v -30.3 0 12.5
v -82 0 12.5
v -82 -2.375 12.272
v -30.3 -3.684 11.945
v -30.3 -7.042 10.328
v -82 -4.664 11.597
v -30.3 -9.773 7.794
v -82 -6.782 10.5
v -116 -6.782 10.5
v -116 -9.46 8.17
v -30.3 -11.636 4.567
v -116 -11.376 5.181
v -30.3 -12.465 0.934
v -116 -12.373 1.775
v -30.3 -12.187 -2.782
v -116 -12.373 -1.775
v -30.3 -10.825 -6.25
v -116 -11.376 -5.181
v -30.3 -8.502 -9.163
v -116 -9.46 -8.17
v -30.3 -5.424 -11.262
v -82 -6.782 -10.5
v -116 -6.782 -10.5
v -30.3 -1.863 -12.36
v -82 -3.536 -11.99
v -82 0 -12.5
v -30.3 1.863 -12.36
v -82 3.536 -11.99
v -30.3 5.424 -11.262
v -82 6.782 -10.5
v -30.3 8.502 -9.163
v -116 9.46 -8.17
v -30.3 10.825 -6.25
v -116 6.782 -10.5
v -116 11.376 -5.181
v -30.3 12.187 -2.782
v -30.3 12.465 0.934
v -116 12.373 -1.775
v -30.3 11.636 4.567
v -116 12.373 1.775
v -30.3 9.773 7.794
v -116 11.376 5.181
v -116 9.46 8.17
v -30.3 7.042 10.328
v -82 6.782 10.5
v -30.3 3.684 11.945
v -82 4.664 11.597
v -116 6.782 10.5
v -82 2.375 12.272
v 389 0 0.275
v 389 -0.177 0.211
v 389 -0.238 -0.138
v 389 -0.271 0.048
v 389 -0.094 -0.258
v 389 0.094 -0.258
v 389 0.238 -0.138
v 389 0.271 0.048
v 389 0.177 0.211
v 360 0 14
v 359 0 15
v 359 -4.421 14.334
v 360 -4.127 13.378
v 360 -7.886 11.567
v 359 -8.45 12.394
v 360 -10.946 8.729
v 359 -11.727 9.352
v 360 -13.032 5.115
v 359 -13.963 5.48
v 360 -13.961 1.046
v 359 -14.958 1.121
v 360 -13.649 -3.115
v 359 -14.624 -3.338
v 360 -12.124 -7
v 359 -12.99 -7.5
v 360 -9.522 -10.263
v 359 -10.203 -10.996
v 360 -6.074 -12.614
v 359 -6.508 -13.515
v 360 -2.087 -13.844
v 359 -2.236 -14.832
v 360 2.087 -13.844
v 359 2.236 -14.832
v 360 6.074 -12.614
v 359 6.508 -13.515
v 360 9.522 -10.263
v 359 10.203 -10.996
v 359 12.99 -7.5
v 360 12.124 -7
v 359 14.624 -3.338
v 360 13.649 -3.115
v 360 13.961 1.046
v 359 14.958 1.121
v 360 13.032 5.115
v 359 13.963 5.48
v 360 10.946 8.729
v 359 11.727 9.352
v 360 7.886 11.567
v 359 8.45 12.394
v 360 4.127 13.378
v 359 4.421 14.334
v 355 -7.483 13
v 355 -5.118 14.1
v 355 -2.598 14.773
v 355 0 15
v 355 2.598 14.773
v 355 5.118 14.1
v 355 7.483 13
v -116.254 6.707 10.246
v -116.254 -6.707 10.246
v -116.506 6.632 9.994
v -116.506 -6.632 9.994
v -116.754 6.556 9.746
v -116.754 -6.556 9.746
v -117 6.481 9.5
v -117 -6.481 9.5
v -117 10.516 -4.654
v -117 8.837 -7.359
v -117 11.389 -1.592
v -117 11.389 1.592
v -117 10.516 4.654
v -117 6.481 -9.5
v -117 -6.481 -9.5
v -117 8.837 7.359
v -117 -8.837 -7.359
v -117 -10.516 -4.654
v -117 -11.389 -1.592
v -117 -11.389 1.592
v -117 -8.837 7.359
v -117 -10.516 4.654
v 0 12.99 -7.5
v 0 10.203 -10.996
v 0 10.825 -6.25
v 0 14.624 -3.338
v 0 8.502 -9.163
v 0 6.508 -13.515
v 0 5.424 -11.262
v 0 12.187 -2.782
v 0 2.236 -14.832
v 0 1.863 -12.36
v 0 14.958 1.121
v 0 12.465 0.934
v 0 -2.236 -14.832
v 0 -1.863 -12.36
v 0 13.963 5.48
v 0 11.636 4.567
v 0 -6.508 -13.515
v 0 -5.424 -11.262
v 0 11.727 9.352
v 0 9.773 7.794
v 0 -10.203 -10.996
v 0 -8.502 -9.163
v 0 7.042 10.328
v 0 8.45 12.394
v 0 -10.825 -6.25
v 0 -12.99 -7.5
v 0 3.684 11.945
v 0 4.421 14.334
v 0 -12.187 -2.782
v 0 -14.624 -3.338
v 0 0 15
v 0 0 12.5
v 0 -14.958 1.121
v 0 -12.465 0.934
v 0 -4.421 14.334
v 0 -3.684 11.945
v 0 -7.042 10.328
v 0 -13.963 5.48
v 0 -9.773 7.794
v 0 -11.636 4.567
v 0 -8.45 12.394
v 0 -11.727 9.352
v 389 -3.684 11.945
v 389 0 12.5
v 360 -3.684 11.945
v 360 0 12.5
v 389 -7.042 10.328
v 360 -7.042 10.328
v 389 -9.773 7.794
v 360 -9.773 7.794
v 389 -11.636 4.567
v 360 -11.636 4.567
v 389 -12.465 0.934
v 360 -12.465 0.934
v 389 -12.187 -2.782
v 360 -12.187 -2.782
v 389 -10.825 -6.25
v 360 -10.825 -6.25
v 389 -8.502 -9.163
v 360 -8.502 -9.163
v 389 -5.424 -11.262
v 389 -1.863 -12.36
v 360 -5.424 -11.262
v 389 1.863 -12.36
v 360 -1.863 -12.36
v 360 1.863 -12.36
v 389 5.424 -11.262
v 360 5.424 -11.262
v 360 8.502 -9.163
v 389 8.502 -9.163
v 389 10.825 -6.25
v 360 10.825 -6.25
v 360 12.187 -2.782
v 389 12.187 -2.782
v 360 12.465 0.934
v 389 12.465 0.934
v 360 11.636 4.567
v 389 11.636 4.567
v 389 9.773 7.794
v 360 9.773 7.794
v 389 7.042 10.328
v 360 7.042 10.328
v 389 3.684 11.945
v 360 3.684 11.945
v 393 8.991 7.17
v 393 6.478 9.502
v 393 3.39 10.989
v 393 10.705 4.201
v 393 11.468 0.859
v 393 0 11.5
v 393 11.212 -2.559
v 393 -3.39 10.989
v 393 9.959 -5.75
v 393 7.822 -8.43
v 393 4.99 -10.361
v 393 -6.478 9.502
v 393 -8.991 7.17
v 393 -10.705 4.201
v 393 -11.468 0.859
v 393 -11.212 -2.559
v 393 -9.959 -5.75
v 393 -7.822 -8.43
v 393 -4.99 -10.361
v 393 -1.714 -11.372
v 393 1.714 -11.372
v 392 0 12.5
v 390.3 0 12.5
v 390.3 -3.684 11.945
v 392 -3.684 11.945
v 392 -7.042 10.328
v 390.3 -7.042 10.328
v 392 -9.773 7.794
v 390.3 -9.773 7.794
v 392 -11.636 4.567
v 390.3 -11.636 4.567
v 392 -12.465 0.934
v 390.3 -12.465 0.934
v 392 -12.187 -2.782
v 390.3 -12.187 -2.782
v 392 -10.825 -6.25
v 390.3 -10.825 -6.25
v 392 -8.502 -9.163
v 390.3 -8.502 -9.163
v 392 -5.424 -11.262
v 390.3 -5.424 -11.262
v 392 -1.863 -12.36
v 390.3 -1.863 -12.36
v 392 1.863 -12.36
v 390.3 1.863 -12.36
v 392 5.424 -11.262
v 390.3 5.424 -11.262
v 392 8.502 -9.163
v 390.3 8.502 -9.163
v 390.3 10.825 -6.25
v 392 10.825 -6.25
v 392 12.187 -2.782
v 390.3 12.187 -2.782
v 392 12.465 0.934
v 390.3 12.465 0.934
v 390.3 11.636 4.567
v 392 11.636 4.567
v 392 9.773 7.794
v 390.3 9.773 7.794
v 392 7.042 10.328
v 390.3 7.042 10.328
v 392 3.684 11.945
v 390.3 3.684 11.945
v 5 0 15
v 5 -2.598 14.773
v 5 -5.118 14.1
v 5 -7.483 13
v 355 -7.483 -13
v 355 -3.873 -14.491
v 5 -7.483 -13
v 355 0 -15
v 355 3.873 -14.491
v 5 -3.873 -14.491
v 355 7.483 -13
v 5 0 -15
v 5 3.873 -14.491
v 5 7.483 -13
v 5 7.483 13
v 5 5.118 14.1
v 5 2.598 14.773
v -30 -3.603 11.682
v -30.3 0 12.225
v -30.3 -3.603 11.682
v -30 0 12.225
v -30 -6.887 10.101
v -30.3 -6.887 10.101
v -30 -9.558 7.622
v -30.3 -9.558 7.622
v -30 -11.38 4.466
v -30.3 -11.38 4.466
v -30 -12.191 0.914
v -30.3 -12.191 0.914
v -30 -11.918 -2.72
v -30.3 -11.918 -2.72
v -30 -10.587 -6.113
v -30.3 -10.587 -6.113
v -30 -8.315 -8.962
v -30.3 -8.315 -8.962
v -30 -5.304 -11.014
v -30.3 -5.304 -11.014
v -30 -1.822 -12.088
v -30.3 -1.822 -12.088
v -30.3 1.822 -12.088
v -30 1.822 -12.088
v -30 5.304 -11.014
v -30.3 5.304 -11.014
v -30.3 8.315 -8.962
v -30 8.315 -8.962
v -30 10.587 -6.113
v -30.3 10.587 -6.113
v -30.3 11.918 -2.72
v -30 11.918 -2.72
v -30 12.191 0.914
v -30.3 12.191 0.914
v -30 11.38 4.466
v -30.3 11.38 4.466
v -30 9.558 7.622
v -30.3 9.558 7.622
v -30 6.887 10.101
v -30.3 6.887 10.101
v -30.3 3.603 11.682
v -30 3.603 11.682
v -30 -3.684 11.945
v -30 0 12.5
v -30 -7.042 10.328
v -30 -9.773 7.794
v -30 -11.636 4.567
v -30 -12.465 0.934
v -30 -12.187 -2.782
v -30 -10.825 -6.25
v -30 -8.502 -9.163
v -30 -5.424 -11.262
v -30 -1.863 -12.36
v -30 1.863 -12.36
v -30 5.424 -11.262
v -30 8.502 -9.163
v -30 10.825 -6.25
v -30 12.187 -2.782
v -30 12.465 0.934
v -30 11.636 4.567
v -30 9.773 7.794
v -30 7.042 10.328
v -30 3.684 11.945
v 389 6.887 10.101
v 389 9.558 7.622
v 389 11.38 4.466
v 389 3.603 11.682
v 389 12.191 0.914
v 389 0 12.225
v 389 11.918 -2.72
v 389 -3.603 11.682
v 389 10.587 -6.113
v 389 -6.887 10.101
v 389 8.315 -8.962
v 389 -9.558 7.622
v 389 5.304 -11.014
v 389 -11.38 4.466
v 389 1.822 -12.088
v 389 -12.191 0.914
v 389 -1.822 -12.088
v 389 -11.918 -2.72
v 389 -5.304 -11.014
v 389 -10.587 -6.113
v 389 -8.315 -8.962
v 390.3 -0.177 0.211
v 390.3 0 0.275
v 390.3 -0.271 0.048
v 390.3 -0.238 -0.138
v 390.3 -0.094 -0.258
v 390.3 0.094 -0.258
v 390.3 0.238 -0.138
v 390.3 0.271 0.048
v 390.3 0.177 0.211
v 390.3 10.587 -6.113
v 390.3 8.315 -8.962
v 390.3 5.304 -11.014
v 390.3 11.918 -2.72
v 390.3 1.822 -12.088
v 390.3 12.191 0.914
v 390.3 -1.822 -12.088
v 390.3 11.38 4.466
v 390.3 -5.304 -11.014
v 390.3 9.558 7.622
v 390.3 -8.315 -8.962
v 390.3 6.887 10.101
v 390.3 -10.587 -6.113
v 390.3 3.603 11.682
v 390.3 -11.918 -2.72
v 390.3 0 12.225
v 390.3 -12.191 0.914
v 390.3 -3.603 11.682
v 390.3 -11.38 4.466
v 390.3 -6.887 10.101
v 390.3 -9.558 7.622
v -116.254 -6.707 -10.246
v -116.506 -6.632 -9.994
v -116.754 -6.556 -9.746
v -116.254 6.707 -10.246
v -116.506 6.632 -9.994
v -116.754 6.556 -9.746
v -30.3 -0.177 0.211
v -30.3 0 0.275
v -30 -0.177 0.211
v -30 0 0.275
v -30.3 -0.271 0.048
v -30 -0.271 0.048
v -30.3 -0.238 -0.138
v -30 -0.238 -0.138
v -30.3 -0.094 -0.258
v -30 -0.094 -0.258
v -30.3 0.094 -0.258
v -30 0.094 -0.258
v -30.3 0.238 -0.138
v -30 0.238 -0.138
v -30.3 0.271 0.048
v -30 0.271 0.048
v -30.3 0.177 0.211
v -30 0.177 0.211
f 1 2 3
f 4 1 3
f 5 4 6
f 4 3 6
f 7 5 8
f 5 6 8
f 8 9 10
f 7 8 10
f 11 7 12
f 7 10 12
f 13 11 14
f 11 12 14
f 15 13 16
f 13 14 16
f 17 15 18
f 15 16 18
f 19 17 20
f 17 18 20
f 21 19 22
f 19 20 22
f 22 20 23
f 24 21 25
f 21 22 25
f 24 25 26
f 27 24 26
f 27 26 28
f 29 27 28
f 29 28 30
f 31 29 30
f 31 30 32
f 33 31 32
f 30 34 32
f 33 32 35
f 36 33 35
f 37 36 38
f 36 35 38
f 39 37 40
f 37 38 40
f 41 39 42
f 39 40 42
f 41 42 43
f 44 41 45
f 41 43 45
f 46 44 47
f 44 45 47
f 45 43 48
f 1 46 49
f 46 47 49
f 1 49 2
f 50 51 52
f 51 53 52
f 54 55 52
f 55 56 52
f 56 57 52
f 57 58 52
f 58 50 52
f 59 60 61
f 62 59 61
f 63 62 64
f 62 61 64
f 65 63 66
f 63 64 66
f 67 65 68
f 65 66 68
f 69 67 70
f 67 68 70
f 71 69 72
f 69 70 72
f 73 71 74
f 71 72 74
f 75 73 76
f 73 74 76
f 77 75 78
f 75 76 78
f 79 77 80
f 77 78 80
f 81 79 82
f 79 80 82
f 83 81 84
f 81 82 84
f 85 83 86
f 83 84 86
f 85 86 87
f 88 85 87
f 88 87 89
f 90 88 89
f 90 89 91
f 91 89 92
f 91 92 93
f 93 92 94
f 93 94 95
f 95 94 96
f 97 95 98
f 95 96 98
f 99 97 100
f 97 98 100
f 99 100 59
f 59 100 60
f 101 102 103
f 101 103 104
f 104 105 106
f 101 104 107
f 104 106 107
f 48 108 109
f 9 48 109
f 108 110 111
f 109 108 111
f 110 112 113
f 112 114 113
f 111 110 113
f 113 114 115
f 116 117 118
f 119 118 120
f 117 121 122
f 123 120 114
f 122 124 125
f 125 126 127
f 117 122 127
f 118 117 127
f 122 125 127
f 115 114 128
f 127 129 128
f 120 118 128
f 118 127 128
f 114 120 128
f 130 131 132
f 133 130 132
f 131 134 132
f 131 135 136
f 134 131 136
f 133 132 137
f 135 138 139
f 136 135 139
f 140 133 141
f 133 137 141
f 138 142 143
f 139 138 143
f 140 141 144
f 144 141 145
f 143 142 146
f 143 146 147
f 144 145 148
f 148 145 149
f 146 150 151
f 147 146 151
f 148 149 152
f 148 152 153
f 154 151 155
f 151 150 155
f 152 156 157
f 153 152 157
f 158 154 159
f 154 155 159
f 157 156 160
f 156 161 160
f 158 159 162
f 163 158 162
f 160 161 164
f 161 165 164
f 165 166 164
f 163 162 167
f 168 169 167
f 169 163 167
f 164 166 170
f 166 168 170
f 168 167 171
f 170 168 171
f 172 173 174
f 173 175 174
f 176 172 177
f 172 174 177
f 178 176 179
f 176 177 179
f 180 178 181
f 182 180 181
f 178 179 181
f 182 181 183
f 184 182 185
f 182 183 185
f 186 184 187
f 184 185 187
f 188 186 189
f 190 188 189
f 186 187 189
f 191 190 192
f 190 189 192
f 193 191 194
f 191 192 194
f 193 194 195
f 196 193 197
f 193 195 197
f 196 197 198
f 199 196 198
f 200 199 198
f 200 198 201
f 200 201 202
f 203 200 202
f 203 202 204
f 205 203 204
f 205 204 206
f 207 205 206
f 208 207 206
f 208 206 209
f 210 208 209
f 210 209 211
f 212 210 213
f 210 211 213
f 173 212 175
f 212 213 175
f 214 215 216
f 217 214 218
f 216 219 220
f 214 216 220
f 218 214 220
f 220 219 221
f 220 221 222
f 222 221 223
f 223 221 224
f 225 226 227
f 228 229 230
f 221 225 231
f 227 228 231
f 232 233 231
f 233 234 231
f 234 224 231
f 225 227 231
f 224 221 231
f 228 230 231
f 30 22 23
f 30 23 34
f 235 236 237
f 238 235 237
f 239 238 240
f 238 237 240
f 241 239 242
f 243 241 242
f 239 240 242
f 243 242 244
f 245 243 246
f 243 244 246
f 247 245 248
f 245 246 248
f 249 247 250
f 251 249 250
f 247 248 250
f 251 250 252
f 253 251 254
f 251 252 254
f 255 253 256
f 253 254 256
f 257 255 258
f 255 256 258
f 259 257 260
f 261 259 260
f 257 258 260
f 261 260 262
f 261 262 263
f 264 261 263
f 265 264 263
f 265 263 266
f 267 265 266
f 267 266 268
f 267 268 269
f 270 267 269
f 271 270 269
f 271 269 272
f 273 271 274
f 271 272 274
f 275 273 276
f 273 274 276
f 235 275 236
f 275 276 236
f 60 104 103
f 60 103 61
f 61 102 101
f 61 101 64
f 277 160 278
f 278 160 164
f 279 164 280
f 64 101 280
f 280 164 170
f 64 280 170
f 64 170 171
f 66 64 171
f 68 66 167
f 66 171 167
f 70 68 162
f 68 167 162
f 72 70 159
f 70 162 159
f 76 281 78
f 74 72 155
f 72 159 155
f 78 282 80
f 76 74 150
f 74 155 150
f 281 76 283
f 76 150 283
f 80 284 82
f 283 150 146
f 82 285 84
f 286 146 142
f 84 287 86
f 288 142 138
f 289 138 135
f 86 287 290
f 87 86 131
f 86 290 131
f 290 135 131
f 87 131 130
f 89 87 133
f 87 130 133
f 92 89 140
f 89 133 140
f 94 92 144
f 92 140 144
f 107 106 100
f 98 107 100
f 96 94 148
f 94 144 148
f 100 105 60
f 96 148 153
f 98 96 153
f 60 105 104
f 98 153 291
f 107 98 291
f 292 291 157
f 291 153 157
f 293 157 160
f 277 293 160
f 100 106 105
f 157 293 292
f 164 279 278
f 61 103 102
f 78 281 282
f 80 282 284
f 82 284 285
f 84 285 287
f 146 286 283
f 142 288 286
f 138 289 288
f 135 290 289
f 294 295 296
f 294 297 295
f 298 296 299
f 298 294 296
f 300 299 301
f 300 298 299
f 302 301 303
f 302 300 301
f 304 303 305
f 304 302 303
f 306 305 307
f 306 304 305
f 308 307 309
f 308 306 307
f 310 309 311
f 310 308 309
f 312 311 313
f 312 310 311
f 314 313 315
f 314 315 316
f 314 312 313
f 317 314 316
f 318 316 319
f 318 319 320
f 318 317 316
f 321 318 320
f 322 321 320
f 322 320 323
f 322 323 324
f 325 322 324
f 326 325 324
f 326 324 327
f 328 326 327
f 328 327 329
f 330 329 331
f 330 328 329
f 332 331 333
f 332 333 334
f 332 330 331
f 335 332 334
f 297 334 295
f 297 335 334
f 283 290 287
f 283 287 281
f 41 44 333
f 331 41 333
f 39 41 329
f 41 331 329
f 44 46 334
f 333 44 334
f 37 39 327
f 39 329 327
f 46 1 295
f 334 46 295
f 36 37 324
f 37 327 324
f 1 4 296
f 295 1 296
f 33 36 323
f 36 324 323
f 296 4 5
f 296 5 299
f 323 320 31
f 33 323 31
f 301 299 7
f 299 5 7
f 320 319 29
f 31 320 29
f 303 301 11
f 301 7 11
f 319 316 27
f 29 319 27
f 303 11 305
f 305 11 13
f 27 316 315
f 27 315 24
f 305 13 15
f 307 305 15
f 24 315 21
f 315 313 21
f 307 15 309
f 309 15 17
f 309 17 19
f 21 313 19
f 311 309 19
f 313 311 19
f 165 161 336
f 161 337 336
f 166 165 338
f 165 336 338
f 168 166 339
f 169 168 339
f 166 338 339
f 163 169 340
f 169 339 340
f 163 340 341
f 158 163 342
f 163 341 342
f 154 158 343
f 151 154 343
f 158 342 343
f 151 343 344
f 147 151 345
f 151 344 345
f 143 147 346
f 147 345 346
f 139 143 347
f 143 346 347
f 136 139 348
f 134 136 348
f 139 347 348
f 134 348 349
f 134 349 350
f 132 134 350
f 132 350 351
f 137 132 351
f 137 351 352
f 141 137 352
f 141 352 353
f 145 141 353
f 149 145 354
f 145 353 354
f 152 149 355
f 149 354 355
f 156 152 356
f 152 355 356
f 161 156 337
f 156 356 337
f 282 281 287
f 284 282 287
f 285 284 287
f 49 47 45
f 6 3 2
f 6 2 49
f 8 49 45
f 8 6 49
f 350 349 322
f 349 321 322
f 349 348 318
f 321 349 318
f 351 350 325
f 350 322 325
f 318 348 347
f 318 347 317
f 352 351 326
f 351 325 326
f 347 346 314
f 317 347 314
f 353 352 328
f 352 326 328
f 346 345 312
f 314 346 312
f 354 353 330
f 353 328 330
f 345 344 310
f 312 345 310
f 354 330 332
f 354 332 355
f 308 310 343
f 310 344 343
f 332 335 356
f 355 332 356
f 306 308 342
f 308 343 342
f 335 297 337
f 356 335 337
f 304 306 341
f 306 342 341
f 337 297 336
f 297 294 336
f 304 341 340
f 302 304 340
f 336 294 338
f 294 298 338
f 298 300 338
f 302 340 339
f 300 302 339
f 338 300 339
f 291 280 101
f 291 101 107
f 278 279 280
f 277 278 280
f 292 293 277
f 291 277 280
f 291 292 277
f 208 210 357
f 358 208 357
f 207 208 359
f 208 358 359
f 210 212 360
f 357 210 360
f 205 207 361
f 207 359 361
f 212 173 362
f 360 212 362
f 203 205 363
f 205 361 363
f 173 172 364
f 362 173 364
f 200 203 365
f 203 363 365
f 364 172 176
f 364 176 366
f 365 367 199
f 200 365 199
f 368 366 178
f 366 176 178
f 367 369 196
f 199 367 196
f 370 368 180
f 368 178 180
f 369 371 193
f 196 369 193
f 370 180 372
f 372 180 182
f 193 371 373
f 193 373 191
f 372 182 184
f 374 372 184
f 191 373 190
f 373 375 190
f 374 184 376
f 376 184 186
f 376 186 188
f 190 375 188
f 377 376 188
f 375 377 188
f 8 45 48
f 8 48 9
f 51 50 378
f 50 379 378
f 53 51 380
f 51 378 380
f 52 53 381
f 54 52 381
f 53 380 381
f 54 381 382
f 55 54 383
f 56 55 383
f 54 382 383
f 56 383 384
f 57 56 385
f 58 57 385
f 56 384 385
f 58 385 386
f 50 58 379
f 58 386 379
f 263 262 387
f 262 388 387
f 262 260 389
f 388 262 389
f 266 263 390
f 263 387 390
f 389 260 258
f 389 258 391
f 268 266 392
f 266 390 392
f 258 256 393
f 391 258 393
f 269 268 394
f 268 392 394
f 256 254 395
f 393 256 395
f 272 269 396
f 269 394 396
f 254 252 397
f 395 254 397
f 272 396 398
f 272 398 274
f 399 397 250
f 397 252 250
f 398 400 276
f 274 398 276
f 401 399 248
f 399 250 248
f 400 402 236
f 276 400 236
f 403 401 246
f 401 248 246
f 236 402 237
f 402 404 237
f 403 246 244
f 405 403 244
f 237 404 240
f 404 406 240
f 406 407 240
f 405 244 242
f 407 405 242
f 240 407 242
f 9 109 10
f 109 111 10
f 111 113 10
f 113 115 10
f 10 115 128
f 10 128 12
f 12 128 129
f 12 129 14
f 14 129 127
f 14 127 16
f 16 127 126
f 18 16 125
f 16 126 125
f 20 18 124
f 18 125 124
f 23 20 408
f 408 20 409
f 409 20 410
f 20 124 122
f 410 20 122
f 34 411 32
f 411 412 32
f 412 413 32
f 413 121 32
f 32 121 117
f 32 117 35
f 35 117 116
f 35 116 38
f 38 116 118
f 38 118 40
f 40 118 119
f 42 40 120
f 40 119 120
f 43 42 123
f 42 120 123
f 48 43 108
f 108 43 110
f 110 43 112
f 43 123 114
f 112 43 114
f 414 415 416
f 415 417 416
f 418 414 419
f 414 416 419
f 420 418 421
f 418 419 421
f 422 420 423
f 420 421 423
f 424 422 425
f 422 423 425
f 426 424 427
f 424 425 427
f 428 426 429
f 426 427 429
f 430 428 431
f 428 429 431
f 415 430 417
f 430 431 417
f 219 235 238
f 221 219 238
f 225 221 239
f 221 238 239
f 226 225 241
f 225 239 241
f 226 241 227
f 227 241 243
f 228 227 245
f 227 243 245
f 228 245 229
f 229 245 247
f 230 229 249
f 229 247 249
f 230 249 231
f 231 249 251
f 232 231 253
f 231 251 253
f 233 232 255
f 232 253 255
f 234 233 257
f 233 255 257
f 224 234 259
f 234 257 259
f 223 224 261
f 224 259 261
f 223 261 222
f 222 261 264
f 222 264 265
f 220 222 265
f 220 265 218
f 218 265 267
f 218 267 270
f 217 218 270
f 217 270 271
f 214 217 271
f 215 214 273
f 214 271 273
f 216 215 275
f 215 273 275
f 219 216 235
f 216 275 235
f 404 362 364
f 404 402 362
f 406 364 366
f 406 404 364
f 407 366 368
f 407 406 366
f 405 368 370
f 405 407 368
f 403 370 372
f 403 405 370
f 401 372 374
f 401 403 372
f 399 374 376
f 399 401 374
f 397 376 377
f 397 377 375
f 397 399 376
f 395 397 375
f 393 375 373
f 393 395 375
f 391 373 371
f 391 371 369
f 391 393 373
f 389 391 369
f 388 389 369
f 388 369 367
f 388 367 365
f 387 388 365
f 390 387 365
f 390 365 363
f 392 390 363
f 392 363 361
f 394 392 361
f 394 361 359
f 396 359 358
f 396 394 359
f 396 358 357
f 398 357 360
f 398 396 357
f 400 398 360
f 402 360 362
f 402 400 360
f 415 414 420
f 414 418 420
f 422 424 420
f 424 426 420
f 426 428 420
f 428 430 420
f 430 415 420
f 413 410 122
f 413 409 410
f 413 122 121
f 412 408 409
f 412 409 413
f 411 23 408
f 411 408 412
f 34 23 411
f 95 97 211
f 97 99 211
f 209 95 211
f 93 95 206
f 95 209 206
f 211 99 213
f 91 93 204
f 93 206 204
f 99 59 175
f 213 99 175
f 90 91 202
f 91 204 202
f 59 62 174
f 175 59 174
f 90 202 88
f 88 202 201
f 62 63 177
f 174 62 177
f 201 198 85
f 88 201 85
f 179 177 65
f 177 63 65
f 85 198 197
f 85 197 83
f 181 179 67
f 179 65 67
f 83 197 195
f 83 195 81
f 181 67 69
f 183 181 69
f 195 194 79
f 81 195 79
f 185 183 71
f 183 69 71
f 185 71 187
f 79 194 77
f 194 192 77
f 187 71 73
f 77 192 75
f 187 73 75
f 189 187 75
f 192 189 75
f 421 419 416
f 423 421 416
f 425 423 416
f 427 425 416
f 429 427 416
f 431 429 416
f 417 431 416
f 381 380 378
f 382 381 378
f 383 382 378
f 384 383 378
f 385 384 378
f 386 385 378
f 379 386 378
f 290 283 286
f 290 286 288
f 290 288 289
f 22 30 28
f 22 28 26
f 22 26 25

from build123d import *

# Parameters (mm, degrees)
F0_W     = 0.3
F0_H     = 11.95
F0_W_2   = 1.3
F4_DEPTH = 350
F6_DEPTH = 35
F7_SIZE2 = 1
F7_SIZE  = 1


with BuildPart() as f1:
    # F0 (on Front) → F1 (revolve)
    with BuildSketch(Plane.XZ):
        Polygon((-30, 0), (0, 0), (0, 12.5), (-30, 12.5), (-30, 12.225), (-30, 0.275), align=None)
        Polygon((0, 12.5), (0, 0), (360, 0), (360, 12.5), (360, 15), (0, 15), align=None)
        Polygon((360, 12.5), (360, 0), (389, 0), (389, 0.275), (389, 12.225), (389, 12.5), align=None)
        with Locations((-30.15, 6.25)):
            Rectangle(F0_W, F0_H)
        Polygon((-30.3, 0), (-30.3, 0.275), (-30.3, 12.225), (-30.3, 12.5), (-117, 12.5), (-117, 0), align=None)
        with Locations((389.65, 6.25)):
            Rectangle(F0_W_2, F0_H)
        Polygon((390.3, 12.225), (390.3, 0.275), (390.3, 0), (393, 0), (393, 12.5), (390.3, 12.5), align=None)
    revolve(axis=Axis((165, 0, 0), (1, 0, 0)))

    # F3 (on offset) → F4 (cut)
    with BuildSketch(Plane.YZ.offset(355)):
        with BuildLine():
            ThreePointArc((7.4833147735, 13), (0, 15), (-7.4833147735, 13))
            Line((-7.4833147735, 13), (7.4833147735, 13))
        make_face()
        with BuildLine():
            Line((7.4833147735, -13), (-7.4833147735, -13))
            ThreePointArc((-7.4833147735, -13), (0, -15), (7.4833147735, -13))
        make_face()
    extrude(amount=-F4_DEPTH, mode=Mode.SUBTRACT)

    # F5 (on face) → F6 (cut)
    with BuildSketch(Plane(origin=(-117, 0, 0), x_dir=(0, -1, 0), z_dir=(-1, 0, 0))):
        with BuildLine():
            ThreePointArc((6.7823299831, 10.5), (0, 12.5), (-6.7823299831, 10.5))
            Line((-6.7823299831, 10.5), (6.7823299831, 10.5))
        make_face()
        with BuildLine():
            Line((6.7823299831, -10.5), (-6.7823299831, -10.5))
            ThreePointArc((-6.7823299831, -10.5), (0, -12.5), (6.7823299831, -10.5))
        make_face()
    extrude(amount=-F6_DEPTH, mode=Mode.SUBTRACT)

    # F7
    f7_edges = [f1.edges().sort_by_distance(p)[0] for p in [
        (-117, 0, 10.5),
        (-117, 12.5, 0),
        (-117, 0, -10.5),
        (-117, -12.5, 0),
        (393, 0, -12.5),
        (360, 0, -15),
    ]]
    chamfer(f7_edges, length=F7_SIZE, length2=F7_SIZE2)


solid = f1.part
